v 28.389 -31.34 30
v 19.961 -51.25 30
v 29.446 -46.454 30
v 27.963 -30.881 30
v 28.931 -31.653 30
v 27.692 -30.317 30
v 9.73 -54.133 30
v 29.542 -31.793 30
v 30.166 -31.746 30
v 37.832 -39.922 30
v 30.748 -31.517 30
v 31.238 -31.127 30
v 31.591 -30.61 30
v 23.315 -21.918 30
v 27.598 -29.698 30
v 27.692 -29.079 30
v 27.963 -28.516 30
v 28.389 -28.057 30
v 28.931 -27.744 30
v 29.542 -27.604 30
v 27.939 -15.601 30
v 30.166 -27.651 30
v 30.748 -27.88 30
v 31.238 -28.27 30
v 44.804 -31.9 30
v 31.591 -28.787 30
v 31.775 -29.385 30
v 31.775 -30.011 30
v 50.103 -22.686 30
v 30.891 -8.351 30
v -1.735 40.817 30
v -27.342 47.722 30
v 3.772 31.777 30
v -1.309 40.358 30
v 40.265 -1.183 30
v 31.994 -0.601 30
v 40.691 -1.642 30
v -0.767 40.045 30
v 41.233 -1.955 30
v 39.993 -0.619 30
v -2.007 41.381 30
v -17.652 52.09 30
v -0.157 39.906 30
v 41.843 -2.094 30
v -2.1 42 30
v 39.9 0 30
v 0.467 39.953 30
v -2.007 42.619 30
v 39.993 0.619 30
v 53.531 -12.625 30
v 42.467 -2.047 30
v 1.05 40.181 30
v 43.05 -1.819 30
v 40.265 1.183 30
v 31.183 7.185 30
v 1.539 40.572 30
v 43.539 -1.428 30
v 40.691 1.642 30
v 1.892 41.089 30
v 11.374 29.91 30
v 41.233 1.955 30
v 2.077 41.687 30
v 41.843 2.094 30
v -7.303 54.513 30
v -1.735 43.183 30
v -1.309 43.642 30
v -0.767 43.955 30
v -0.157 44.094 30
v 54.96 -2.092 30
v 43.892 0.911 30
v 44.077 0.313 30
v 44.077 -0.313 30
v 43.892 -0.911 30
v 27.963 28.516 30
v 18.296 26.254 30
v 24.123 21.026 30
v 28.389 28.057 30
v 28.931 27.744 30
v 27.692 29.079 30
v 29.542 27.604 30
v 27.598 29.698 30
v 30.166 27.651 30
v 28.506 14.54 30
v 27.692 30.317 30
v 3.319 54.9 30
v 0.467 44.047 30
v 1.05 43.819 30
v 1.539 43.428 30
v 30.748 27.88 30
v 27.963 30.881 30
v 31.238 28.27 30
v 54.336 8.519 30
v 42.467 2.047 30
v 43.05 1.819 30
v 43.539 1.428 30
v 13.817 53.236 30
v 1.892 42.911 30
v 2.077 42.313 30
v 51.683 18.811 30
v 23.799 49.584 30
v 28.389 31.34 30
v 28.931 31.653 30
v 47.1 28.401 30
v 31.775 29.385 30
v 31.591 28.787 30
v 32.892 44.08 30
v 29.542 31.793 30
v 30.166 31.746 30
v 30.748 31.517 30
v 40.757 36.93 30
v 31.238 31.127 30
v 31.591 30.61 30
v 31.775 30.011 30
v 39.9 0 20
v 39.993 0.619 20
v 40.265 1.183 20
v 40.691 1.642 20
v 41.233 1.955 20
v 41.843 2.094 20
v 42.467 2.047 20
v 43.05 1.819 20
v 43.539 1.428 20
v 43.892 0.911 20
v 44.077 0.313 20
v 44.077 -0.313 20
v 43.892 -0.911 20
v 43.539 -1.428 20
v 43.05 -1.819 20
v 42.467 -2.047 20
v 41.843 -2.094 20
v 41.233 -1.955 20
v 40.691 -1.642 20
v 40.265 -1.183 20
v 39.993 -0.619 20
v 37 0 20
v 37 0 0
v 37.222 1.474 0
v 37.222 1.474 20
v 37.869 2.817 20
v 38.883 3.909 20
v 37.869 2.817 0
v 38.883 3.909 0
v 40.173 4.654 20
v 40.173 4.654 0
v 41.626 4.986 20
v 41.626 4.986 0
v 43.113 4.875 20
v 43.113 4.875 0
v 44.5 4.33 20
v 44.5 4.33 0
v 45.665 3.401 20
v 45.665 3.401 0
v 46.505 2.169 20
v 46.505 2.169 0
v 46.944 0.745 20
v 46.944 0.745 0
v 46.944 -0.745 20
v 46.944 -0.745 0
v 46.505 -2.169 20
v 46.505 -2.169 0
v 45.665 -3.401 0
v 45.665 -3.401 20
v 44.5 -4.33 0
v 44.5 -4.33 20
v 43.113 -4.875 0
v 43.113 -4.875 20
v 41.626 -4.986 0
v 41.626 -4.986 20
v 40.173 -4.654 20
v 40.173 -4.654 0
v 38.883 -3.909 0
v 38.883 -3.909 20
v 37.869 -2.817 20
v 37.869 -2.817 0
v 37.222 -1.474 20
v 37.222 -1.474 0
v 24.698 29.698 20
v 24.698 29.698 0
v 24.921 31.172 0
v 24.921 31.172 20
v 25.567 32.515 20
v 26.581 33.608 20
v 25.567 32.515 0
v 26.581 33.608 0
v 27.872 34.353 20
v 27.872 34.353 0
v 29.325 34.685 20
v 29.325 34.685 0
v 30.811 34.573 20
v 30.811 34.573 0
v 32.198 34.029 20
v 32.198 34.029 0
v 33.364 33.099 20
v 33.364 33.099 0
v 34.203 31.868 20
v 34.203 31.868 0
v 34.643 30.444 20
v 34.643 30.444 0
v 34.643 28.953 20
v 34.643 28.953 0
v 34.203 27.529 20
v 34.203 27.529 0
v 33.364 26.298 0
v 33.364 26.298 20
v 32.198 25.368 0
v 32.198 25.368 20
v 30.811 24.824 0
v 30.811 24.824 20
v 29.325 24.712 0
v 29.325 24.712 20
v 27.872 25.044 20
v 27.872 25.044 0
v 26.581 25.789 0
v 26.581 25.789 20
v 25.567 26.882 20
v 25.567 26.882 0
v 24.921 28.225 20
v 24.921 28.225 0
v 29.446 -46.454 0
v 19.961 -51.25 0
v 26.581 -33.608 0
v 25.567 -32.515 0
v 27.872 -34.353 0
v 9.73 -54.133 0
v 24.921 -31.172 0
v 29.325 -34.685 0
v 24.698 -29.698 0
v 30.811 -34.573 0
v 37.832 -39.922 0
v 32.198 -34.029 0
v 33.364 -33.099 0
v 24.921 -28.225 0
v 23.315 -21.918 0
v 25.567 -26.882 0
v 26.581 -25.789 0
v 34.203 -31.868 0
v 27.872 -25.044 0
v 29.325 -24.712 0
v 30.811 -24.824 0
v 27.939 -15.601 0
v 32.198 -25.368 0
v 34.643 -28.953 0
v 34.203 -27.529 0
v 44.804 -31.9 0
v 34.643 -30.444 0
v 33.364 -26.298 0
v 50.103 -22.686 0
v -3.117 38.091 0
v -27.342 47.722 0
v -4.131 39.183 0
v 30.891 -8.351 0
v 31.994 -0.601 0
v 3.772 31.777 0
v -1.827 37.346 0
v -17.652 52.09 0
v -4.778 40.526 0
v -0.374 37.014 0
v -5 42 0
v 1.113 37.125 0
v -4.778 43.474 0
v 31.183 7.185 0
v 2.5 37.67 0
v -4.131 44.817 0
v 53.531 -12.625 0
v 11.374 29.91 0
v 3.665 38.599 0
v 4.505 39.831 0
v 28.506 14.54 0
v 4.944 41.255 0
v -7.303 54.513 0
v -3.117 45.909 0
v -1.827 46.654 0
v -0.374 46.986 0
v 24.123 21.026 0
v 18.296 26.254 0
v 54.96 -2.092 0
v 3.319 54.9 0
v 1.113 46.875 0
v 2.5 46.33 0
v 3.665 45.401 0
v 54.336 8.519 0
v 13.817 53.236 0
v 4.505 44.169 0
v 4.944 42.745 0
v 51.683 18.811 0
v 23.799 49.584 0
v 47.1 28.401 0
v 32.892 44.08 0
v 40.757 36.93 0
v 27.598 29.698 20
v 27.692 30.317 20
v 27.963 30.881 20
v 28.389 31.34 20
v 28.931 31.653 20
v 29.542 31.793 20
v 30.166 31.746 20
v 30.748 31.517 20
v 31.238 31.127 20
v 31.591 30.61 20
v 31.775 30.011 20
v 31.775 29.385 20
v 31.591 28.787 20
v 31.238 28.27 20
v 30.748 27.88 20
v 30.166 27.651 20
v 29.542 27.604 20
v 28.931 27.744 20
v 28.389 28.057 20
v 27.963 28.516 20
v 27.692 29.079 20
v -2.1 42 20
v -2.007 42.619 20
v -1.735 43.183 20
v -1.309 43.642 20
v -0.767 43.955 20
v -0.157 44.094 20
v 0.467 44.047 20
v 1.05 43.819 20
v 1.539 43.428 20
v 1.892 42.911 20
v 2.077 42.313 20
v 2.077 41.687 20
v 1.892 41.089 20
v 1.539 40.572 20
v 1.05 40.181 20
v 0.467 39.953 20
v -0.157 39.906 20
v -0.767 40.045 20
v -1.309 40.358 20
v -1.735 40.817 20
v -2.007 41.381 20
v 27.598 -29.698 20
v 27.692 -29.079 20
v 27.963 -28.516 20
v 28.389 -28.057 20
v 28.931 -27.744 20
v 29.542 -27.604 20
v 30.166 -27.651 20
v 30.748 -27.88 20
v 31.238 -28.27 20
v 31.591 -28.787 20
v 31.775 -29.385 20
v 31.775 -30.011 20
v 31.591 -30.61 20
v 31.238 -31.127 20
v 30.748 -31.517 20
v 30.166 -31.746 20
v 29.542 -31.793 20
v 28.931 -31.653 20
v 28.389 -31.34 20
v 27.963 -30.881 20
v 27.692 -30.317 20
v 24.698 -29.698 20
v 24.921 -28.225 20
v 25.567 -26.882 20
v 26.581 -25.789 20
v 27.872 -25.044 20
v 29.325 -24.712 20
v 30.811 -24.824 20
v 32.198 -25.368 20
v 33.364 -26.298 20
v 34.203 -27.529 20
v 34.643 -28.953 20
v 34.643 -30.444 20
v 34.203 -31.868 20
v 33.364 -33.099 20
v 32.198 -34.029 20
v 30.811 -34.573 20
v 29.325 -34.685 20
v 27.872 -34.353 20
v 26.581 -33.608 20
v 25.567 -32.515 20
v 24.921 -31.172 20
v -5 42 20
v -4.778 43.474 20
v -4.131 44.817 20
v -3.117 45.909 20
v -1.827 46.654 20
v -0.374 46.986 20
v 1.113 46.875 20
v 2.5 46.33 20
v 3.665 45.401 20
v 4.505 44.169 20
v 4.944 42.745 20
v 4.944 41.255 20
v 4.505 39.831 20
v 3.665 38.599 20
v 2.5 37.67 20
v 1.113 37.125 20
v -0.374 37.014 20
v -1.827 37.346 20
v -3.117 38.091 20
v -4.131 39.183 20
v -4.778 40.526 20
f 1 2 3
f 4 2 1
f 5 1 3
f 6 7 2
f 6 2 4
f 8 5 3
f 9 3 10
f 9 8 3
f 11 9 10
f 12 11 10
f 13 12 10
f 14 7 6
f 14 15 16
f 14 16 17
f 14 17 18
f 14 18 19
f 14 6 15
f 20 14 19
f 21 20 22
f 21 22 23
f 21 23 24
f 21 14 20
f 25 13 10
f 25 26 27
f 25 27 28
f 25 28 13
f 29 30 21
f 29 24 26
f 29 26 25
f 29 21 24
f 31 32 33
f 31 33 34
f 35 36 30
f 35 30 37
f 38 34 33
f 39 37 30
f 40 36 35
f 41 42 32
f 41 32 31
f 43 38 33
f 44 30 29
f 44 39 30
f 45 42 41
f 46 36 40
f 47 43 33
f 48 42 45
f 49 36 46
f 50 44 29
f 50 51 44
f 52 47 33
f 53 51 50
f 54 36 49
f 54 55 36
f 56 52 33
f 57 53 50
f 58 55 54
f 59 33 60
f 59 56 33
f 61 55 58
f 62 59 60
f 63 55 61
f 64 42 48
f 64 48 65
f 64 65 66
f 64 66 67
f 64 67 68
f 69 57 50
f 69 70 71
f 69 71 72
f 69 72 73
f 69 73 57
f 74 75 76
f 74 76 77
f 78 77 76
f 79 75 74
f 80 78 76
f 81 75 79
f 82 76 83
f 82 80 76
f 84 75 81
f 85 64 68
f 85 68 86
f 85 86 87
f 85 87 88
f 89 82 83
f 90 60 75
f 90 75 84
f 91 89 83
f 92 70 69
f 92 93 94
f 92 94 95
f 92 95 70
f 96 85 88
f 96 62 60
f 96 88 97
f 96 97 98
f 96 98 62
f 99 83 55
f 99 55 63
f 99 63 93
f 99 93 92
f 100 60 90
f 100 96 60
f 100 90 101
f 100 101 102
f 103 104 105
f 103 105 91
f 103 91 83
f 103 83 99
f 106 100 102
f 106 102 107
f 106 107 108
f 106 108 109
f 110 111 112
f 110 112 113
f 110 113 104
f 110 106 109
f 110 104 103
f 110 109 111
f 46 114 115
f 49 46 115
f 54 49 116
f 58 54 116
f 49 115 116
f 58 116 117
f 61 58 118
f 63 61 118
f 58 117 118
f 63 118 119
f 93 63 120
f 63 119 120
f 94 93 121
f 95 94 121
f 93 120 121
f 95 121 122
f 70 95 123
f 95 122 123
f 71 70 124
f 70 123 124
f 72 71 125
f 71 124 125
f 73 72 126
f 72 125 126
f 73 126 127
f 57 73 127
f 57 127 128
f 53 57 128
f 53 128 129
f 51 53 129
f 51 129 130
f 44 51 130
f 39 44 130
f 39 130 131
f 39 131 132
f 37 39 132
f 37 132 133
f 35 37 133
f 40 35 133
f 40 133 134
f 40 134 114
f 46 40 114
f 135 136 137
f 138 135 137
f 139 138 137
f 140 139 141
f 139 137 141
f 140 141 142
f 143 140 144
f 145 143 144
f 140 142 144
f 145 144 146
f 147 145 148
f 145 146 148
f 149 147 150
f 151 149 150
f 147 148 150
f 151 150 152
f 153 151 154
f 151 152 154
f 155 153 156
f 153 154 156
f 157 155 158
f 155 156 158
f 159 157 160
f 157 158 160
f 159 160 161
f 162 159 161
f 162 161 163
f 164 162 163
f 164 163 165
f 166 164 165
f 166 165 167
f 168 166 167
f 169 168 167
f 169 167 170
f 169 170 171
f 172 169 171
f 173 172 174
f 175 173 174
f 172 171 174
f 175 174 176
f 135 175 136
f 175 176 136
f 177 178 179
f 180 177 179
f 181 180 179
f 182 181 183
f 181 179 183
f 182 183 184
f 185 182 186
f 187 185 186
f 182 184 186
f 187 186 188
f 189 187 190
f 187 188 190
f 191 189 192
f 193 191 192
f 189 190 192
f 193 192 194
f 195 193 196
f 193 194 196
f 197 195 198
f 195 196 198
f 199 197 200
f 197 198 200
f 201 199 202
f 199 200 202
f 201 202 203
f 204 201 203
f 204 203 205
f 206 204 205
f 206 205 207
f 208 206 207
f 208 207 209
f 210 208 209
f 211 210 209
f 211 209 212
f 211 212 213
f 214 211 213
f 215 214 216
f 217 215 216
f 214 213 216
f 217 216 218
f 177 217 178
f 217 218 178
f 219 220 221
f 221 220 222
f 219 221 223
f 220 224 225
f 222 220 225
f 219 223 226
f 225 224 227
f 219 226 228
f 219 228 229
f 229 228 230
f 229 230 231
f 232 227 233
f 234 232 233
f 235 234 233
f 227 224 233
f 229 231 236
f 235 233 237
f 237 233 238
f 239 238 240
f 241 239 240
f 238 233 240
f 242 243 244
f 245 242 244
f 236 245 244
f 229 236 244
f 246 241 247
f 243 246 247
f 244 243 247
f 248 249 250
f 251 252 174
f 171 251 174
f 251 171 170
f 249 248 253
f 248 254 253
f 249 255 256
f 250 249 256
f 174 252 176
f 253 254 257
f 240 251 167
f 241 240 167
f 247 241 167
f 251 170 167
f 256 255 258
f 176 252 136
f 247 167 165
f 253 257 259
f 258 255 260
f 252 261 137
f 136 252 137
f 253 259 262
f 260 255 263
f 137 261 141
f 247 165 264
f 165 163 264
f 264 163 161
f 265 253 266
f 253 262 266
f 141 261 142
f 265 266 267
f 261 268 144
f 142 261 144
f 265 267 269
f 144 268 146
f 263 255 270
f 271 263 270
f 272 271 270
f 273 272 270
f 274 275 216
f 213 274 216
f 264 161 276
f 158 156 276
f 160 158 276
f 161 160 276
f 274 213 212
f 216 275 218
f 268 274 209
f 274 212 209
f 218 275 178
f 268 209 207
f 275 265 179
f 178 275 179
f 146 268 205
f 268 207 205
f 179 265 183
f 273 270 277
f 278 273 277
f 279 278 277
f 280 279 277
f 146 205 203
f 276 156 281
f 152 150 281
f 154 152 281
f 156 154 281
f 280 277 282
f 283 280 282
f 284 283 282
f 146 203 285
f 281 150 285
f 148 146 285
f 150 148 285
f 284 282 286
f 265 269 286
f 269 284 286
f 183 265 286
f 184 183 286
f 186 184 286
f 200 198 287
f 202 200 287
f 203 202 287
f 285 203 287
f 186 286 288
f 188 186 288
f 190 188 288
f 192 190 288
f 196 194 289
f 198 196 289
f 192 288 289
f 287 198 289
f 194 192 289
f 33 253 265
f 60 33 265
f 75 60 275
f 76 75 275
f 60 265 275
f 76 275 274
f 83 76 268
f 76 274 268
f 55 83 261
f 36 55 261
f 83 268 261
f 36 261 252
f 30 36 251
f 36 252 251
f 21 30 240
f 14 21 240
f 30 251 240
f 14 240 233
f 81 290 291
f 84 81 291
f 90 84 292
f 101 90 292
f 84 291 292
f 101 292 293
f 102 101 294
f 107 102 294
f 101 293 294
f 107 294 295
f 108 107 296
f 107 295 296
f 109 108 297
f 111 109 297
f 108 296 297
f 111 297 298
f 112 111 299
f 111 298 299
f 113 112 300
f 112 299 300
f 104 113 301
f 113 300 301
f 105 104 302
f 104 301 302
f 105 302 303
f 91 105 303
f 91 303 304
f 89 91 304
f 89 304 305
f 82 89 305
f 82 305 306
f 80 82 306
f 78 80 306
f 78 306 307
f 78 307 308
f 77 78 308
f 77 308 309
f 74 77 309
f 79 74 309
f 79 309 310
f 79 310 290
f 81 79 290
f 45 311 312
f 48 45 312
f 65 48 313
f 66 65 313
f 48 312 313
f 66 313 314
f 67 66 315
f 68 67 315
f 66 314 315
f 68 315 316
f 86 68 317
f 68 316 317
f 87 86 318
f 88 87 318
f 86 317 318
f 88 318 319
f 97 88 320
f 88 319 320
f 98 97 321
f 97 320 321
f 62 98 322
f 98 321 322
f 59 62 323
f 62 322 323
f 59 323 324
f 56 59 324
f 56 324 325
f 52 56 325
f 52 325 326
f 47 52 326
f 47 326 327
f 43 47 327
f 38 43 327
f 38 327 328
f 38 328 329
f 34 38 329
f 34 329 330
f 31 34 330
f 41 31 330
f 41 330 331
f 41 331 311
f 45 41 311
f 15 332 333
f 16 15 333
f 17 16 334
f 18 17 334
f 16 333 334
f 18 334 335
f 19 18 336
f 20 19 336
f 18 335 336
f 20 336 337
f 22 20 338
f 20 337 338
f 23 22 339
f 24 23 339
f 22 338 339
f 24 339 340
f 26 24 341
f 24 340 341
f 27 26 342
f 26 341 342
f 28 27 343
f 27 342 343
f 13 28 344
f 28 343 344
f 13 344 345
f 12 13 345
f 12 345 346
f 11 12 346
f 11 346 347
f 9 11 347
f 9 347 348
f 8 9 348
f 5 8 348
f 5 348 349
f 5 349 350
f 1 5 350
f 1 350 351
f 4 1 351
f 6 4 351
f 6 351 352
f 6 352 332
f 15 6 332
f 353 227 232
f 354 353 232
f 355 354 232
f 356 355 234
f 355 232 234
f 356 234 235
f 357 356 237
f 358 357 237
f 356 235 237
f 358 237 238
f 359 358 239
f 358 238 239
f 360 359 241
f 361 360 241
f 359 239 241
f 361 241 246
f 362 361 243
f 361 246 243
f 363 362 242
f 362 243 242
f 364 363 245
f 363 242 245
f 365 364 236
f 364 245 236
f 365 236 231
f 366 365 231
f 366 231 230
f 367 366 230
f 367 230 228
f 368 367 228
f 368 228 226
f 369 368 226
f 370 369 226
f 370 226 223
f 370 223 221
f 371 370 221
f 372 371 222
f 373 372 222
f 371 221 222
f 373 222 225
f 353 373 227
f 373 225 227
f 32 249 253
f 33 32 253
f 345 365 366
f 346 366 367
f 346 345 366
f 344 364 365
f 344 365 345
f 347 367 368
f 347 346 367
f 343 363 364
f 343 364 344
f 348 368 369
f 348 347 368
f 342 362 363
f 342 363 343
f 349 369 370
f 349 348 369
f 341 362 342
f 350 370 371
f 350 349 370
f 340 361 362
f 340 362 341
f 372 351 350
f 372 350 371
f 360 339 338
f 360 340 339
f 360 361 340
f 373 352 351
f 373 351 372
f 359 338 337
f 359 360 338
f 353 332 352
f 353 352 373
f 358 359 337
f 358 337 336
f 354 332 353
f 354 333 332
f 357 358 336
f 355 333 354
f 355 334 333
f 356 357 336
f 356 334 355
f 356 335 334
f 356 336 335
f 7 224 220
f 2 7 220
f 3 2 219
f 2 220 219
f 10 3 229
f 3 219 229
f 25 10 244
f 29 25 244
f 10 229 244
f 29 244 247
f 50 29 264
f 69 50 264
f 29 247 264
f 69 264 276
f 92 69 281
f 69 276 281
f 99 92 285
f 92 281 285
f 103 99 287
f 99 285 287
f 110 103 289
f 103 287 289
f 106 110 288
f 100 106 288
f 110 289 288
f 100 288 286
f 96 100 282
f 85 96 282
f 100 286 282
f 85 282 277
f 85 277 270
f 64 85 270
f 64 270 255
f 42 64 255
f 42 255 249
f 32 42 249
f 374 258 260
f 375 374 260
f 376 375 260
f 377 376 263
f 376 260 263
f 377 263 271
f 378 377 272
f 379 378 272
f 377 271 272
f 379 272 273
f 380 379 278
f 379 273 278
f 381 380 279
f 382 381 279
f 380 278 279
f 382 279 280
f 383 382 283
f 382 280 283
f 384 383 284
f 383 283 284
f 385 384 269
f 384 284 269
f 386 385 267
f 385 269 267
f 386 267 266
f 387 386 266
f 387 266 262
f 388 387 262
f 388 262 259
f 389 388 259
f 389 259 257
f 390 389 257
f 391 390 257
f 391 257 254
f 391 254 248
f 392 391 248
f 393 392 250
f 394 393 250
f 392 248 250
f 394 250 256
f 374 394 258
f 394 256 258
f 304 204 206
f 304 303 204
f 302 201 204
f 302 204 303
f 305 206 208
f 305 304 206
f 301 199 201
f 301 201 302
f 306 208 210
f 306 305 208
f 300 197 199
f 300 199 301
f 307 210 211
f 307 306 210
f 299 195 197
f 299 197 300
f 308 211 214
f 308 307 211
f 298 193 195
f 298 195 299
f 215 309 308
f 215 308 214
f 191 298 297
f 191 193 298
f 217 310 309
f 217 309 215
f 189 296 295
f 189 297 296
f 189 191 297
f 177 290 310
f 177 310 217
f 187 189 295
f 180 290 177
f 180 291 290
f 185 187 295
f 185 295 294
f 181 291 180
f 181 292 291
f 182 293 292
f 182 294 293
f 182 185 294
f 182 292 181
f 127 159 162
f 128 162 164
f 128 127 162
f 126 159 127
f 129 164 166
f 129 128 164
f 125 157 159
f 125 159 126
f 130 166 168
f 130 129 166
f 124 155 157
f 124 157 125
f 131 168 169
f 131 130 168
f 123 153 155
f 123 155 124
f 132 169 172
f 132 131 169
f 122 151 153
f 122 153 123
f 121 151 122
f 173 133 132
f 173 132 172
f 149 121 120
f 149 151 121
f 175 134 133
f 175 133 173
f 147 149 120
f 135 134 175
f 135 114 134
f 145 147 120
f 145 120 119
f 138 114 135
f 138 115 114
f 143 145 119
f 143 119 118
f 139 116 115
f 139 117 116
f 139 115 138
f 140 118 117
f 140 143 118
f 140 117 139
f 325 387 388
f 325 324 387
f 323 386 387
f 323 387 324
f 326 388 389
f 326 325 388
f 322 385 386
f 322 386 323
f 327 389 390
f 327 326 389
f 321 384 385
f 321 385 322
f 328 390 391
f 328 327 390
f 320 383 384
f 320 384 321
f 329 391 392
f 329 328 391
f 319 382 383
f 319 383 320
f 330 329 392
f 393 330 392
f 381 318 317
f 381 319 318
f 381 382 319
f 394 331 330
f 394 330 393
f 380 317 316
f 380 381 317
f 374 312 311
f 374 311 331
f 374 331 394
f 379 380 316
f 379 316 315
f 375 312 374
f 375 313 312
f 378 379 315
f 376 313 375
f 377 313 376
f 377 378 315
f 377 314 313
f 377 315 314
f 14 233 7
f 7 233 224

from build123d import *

# Parameters (mm, degrees)
EXTRUDE_1_DEPTH         = 30
HOLE_WIZARD_4_2_4_2_1_D = 4.2
SKETCH_7_R              = 5
CUT_EXTRUDE_1_DEPTH     = 20


with BuildPart() as part:
    # 草图1 → 凸台-拉伸1 (new body)
    with BuildSketch(Plane.XY):
        with BuildLine():
            Line((-27.342107977, 47.722207948), (3.772223289, 31.776883602))
            ThreePointArc((3.772223289, 31.776883602), (30.070163865, 10.944644586), (23.315477742, -21.917766712))
            Line((23.315477742, -21.917766712), (9.729974097, -54.132500442))
            ThreePointArc((9.729974097, -54.132500442), (51.683094143, 18.811107883), (-27.342107977, 47.722207948))
        make_face()
    extrude(amount=EXTRUDE_1_DEPTH)

    # Ø4.2 (4.2) 直径孔1 (through all)
    with Locations(Plane(origin=(0, 42, 30), x_dir=(1, 0, 0), z_dir=(0, 0, 1))):
        with Locations((0, 0), (29.69848481, -12.30151519), (42, -42), (29.69848481, -71.69848481)):
            Hole(HOLE_WIZARD_4_2_4_2_1_D / 2)

    # 草图7 → 切除-拉伸1 (cut)
    with BuildSketch(Plane(origin=(0, 0, 0), x_dir=(-1, 0, 0), z_dir=(0, 0, -1))):
        with Locations((0, 42)):
            Circle(SKETCH_7_R)
        with Locations((-29.69848481, 29.69848481)):
            Circle(SKETCH_7_R)
        with Locations((-42, 0)):
            Circle(SKETCH_7_R)
        with Locations((-29.69848481, -29.69848481)):
            Circle(SKETCH_7_R)
    extrude(amount=-CUT_EXTRUDE_1_DEPTH, mode=Mode.SUBTRACT)


solid = part.part
